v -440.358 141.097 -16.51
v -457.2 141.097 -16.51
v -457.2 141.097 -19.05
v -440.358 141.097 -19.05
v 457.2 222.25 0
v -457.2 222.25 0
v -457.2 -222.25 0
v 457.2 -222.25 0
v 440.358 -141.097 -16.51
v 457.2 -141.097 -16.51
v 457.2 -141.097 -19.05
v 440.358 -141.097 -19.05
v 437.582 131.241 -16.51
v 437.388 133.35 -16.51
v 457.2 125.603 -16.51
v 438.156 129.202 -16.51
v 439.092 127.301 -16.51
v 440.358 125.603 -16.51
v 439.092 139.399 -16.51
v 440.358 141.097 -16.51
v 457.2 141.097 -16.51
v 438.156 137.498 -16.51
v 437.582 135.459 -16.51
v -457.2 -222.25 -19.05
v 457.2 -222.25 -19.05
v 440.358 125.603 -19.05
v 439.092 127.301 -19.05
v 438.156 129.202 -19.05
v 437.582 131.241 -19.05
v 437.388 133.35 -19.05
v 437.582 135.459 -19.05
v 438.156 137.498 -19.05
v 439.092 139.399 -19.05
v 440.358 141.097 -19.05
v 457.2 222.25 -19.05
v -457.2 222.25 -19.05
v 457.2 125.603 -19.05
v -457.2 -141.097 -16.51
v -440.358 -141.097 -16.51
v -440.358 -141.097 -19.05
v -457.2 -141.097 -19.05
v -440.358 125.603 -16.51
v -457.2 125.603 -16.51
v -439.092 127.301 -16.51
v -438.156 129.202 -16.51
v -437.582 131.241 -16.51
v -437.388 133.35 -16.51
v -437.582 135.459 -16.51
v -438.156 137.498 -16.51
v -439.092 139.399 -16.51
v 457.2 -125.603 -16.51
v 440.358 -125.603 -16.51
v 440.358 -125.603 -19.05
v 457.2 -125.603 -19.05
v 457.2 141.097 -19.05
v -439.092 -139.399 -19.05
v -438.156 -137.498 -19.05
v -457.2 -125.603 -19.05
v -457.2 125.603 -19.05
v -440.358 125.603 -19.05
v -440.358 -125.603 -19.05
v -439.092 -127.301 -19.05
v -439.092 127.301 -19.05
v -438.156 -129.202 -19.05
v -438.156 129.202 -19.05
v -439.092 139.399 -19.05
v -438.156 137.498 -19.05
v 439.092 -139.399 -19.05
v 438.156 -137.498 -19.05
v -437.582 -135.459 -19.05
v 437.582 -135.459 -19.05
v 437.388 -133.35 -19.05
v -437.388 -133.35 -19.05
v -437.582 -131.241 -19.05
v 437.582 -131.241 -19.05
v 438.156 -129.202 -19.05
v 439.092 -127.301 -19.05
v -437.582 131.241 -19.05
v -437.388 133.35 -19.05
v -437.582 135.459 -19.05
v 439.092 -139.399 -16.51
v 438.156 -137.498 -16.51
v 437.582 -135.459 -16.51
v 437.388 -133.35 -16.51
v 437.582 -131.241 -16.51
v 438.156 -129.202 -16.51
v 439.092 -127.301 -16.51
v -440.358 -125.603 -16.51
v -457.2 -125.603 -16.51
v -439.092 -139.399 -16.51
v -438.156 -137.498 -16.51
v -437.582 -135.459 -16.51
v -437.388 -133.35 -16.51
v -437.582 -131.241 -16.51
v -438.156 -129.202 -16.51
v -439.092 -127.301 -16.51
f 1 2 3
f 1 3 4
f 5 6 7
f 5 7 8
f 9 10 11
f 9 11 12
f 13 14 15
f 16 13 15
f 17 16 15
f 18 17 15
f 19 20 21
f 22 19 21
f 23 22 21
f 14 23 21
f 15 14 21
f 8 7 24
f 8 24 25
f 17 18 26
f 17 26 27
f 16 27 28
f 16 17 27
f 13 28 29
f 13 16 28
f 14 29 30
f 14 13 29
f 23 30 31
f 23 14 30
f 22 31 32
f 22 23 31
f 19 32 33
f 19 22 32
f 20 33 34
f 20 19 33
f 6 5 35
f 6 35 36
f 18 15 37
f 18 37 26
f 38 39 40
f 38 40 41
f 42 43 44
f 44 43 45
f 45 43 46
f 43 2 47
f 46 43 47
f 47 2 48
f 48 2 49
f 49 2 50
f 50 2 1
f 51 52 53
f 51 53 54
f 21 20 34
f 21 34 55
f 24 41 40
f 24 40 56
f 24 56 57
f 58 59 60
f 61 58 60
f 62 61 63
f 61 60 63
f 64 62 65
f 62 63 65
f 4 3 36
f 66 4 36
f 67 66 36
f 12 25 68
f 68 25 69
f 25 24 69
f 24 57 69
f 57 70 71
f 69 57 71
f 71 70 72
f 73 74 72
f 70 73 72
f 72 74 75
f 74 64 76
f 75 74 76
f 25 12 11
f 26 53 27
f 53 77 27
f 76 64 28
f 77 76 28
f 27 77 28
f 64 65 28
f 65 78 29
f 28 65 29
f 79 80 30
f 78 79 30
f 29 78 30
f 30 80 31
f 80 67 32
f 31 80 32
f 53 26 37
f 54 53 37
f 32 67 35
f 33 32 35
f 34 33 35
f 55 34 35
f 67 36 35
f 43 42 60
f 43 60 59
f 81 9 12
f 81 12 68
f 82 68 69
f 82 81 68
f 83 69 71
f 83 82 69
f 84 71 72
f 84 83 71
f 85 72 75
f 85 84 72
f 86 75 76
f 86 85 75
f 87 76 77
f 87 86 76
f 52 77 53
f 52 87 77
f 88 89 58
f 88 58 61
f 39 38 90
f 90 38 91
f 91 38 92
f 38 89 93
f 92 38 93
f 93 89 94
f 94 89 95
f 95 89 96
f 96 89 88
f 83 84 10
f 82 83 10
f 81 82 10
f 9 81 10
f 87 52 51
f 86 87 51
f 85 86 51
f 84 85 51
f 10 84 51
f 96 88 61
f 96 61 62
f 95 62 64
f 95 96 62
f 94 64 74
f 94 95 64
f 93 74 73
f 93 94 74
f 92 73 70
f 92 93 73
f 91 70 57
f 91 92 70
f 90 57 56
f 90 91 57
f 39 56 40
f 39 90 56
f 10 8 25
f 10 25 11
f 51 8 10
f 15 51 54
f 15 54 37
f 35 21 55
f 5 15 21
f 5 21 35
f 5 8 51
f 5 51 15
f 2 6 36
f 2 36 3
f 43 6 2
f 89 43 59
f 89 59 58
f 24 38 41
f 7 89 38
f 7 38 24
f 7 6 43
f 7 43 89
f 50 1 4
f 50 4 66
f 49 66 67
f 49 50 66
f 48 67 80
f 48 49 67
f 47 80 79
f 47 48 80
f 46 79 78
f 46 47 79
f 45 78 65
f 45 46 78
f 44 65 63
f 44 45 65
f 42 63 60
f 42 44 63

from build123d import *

# Parameters (mm, degrees)
F0_W     = 16.256
F0_H     = 12.954
F1_DEPTH = 16.51
F2_DEPTH = 19.05


with BuildPart() as f1:
    # F0 (on Top) → F1 (new body)
    with BuildSketch(Plane.XY):
        with BuildLine():
            Line((457.2, 141.097), (457.2, 222.25))
            Line((457.2, 222.25), (-457.2, 222.25))
            Line((-457.2, 222.25), (-457.2, 141.097))
            Line((-457.2, 141.097), (-440.357985, 141.097))
            ThreePointArc((-440.357985, 141.097), (-437.388, 133.35), (-440.357985, 125.603))
            Line((-440.357985, 125.603), (-457.2, 125.603))
            Line((-457.2, 125.603), (-457.2, -125.603))
            Line((-457.2, -125.603), (-440.357985, -125.603))
            ThreePointArc((-440.357985, -125.603), (-437.388, -133.35), (-440.357985, -141.097))
            Line((-440.357985, -141.097), (-457.2, -141.097))
            Line((-457.2, -141.097), (-457.2, -222.25))
            Line((-457.2, -222.25), (457.2, -222.25))
            Line((457.2, -222.25), (457.2, -141.097))
            Line((457.2, -141.097), (440.357985, -141.097))
            ThreePointArc((440.357985, -141.097), (437.388, -133.35), (440.357985, -125.603))
            Line((440.357985, -125.603), (457.2, -125.603))
            Line((457.2, -125.603), (457.2, 125.603))
            Line((457.2, 125.603), (440.357985, 125.603))
            ThreePointArc((440.357985, 125.603), (437.388, 133.35), (440.357985, 141.097))
            Line((440.357985, 141.097), (457.2, 141.097))
        make_face()
        with BuildLine():
            Line((457.2, 125.603), (457.2, 141.097))
            Line((457.2, 141.097), (440.357985, 141.097))
            ThreePointArc((440.357985, 141.097), (437.388, 133.35), (440.357985, 125.603))
            Line((440.357985, 125.603), (457.2, 125.603))
        make_face()
        with BuildLine():
            Line((-440.357985, 141.097), (-457.2, 141.097))
            Line((-457.2, 141.097), (-457.2, 139.827))
            Line((-457.2, 139.827), (-440.944, 139.827))
            ThreePointArc((-440.944, 139.827), (-438.658, 133.35), (-440.944, 126.873))
            Line((-440.944, 126.873), (-457.2, 126.873))
            Line((-457.2, 126.873), (-457.2, 125.603))
            Line((-457.2, 125.603), (-440.357985, 125.603))
            ThreePointArc((-440.357985, 125.603), (-437.388, 133.35), (-440.357985, 141.097))
        make_face()
        with Locations((-449.072, 133.35)):
            Rectangle(F0_W, F0_H)
        with BuildLine():
            Line((457.2, -141.097), (457.2, -125.603))
            Line((457.2, -125.603), (440.357985, -125.603))
            ThreePointArc((440.357985, -125.603), (437.388, -133.35), (440.357985, -141.097))
            Line((440.357985, -141.097), (457.2, -141.097))
        make_face()
        with BuildLine():
            Line((-440.357985, -125.603), (-457.2, -125.603))
            Line((-457.2, -125.603), (-457.2, -126.873))
            Line((-457.2, -126.873), (-440.944, -126.873))
            ThreePointArc((-440.944, -126.873), (-438.658, -133.35), (-440.944, -139.827))
            Line((-440.944, -139.827), (-457.2, -139.827))
            Line((-457.2, -139.827), (-457.2, -141.097))
            Line((-457.2, -141.097), (-440.357985, -141.097))
            ThreePointArc((-440.357985, -141.097), (-437.388, -133.35), (-440.357985, -125.603))
        make_face()
        with Locations((-449.072, -133.35)):
            Rectangle(F0_W, F0_H)
        with BuildLine():
            ThreePointArc((-440.944, 126.873), (-438.658, 133.35), (-440.944, 139.827))
            Line((-440.944, 139.827), (-440.944, 126.873))
        make_face()
        with BuildLine():
            ThreePointArc((-440.944, -139.827), (-438.658, -133.35), (-440.944, -126.873))
            Line((-440.944, -126.873), (-440.944, -139.827))
        make_face()
    extrude(amount=-F1_DEPTH)

    # F0 (on Top) → F2 (join)
    with BuildSketch(Plane.XY):
        with BuildLine():
            Line((457.2, 141.097), (457.2, 222.25))
            Line((457.2, 222.25), (-457.2, 222.25))
            Line((-457.2, 222.25), (-457.2, 141.097))
            Line((-457.2, 141.097), (-440.357985, 141.097))
            ThreePointArc((-440.357985, 141.097), (-437.388, 133.35), (-440.357985, 125.603))
            Line((-440.357985, 125.603), (-457.2, 125.603))
            Line((-457.2, 125.603), (-457.2, -125.603))
            Line((-457.2, -125.603), (-440.357985, -125.603))
            ThreePointArc((-440.357985, -125.603), (-437.388, -133.35), (-440.357985, -141.097))
            Line((-440.357985, -141.097), (-457.2, -141.097))
            Line((-457.2, -141.097), (-457.2, -222.25))
            Line((-457.2, -222.25), (457.2, -222.25))
            Line((457.2, -222.25), (457.2, -141.097))
            Line((457.2, -141.097), (440.357985, -141.097))
            ThreePointArc((440.357985, -141.097), (437.388, -133.35), (440.357985, -125.603))
            Line((440.357985, -125.603), (457.2, -125.603))
            Line((457.2, -125.603), (457.2, 125.603))
            Line((457.2, 125.603), (440.357985, 125.603))
            ThreePointArc((440.357985, 125.603), (437.388, 133.35), (440.357985, 141.097))
            Line((440.357985, 141.097), (457.2, 141.097))
        make_face()
    extrude(amount=-F2_DEPTH)


solid = f1.part
